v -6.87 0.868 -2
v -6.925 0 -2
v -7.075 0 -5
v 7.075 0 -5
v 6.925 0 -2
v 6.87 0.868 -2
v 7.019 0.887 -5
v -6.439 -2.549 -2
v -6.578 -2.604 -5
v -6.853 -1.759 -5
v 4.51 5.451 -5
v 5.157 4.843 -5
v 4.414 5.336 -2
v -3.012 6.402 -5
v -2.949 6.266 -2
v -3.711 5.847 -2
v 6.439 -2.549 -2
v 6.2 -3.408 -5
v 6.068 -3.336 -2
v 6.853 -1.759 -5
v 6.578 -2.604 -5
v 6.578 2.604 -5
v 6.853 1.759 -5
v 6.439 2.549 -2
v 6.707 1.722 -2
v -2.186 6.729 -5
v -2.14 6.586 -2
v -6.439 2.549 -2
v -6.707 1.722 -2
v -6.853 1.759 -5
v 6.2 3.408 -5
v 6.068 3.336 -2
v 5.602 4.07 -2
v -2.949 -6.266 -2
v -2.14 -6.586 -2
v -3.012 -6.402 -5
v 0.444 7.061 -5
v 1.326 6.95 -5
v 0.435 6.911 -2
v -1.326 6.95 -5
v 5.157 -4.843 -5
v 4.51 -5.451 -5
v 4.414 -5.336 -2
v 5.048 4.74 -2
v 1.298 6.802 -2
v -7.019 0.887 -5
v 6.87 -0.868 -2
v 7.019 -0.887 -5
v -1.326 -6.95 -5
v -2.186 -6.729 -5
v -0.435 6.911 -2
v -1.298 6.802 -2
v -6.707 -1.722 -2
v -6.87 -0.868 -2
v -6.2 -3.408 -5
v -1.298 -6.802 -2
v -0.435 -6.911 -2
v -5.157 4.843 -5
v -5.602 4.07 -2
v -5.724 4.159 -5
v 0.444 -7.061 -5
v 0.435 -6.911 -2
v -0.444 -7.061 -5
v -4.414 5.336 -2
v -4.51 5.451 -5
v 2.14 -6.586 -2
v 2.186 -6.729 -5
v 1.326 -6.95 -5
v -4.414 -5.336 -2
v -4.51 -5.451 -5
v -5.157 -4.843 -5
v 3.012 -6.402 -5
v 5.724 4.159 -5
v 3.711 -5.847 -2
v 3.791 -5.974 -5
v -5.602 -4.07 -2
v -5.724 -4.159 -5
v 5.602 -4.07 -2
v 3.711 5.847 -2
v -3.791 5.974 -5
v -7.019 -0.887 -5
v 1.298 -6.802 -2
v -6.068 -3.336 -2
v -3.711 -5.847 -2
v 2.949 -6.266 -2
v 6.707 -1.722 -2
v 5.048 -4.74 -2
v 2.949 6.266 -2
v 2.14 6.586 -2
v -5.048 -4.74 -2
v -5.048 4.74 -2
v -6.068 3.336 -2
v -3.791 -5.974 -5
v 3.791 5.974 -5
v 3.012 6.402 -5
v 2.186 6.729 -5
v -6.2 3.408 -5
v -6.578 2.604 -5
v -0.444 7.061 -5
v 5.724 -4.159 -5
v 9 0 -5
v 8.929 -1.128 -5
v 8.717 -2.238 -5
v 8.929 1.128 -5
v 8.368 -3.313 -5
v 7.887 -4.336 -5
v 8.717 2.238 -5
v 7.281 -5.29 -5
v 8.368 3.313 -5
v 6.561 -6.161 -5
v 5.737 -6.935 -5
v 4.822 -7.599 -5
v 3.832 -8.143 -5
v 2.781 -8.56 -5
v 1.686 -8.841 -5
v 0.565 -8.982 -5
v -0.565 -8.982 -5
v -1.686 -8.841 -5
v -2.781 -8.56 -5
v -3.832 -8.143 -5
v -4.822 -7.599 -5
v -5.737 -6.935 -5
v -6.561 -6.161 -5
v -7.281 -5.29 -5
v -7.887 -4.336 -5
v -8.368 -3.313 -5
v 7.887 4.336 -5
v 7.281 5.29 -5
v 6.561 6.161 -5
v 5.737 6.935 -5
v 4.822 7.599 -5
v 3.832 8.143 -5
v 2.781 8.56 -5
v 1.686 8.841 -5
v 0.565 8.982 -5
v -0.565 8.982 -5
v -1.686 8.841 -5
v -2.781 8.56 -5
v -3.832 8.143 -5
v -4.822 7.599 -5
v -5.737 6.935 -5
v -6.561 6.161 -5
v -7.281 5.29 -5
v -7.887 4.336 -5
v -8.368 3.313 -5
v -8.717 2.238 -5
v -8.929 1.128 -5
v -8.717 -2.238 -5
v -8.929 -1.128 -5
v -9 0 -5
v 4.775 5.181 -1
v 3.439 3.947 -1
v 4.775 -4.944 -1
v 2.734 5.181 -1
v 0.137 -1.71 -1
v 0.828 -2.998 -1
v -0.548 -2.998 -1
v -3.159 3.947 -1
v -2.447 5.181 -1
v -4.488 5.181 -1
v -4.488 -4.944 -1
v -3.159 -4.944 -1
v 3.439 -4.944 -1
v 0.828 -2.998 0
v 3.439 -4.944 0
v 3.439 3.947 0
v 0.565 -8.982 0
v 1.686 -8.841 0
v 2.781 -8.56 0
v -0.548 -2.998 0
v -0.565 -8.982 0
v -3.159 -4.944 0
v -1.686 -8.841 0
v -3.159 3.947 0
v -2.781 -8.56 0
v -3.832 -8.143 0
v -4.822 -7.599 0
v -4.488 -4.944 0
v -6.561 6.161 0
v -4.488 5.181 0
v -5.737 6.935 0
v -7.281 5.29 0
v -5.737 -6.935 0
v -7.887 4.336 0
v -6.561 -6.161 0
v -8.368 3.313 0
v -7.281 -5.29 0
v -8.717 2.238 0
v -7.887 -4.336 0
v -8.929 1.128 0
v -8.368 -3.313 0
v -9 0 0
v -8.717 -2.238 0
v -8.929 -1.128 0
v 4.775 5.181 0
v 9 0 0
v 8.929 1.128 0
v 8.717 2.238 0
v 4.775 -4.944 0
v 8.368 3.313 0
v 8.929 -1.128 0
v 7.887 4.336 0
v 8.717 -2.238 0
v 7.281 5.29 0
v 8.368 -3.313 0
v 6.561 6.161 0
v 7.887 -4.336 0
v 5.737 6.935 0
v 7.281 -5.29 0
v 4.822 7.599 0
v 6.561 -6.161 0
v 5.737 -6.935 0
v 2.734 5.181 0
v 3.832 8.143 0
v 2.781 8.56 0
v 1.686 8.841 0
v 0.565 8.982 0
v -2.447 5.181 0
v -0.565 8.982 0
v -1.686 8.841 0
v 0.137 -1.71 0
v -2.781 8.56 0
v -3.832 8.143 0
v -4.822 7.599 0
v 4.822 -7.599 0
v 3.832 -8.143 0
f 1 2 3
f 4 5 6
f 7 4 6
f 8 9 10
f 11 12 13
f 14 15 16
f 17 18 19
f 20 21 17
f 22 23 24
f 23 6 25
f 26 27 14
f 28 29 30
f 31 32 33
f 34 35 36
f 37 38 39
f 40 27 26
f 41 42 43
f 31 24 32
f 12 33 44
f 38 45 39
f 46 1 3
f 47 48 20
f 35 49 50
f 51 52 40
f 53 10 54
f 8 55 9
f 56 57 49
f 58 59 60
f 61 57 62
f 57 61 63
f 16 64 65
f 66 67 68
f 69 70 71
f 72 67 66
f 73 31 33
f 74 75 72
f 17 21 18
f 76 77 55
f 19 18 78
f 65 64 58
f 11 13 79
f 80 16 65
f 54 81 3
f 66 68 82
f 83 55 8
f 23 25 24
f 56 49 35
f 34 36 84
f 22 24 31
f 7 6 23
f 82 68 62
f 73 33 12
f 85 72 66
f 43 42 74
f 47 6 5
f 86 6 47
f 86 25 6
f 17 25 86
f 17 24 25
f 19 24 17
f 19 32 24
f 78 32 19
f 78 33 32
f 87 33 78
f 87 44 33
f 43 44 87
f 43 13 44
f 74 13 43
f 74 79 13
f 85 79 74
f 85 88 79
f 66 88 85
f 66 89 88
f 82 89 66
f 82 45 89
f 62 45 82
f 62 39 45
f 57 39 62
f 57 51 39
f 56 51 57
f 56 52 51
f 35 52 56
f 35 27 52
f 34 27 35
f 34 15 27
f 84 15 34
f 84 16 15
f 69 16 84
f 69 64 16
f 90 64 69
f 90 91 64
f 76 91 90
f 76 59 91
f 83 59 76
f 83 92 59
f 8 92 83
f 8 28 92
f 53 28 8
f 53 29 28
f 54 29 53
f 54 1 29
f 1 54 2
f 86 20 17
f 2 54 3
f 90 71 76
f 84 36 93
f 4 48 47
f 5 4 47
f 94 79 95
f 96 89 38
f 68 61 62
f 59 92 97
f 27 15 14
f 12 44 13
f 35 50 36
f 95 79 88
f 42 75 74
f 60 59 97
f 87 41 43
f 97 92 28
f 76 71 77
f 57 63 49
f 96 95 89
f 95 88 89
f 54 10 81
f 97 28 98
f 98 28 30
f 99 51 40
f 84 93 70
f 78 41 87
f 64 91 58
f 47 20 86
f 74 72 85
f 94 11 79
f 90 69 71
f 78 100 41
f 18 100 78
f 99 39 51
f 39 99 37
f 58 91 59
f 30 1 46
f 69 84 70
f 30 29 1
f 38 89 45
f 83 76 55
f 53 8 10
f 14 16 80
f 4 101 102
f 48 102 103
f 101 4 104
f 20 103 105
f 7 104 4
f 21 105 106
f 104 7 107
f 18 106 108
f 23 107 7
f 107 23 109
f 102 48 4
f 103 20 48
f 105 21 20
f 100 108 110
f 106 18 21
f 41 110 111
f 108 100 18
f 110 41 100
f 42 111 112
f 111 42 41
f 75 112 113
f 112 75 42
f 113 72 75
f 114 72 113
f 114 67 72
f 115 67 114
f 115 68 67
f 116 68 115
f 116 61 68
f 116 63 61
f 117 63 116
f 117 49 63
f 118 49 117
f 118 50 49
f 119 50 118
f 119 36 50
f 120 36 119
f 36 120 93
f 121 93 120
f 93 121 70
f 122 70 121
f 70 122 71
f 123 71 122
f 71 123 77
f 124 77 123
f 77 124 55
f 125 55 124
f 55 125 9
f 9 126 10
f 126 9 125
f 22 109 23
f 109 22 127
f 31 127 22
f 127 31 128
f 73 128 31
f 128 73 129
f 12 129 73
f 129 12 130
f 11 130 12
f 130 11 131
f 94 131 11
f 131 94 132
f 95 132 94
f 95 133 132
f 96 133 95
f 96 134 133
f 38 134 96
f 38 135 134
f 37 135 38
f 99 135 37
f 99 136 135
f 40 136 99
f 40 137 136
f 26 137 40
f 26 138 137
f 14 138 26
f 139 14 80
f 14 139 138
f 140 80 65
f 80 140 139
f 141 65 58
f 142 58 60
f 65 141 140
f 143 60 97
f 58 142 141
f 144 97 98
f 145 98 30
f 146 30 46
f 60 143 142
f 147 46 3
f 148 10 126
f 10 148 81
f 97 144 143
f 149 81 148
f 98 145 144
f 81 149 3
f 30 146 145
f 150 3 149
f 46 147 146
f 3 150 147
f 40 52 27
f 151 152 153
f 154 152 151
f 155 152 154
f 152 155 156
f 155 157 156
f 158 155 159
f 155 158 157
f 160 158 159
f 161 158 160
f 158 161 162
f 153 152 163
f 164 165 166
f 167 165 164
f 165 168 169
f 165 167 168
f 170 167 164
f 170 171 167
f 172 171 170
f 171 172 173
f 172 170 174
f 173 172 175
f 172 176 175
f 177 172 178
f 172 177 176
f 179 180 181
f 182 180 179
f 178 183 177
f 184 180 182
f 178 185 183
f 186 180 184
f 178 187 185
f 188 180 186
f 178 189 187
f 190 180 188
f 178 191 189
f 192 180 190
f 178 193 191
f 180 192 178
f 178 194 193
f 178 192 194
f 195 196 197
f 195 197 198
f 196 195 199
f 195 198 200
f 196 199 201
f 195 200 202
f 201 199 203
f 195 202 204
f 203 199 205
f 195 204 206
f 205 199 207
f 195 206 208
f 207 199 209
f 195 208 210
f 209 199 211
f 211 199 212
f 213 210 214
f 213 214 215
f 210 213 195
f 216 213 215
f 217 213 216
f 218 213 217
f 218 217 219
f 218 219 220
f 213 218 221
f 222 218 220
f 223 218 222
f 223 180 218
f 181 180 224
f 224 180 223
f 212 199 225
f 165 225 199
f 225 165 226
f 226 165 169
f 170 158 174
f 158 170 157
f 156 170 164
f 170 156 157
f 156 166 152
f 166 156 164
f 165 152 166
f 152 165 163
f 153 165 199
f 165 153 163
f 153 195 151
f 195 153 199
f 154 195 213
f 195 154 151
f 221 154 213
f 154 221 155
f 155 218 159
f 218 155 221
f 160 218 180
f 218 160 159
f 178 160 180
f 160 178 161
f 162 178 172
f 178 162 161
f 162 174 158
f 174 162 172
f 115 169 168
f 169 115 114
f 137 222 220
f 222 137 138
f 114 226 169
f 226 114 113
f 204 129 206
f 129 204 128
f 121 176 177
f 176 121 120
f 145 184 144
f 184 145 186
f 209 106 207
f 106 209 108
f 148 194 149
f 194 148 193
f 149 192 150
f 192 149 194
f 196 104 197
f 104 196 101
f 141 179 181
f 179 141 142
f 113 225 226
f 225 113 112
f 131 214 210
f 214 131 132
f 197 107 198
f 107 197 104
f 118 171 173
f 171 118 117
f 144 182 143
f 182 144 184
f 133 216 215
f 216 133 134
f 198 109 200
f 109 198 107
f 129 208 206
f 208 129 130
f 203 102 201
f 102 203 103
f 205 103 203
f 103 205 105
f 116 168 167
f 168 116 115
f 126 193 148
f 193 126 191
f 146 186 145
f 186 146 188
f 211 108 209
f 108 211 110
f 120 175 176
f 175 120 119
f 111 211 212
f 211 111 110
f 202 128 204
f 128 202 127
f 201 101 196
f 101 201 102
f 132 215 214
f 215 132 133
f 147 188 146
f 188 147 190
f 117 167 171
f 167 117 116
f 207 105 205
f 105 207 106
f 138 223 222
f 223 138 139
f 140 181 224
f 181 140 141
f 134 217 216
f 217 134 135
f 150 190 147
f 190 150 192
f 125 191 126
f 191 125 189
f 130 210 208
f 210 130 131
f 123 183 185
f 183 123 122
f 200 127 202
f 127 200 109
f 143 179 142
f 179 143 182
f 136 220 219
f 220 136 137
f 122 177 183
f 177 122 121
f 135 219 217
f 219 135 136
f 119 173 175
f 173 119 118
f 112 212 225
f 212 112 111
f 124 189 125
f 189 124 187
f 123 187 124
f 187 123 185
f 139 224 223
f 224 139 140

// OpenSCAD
$fn = 50;

difference() {
	union() {
		translate(v = [0, 0, -5.0]) {
			cylinder(h = 5, r = 9.0);
		}
	}
	union() {
		#translate(v = [0, 0, -5.0]) {
			cylinder(h = 3, r1 = 7.075, r2 = 6.925);
		}
		translate(v = [0, 0, -1]) {
			linear_extrude(height = 1) {
				text(font = "Impact", halign = "center", size = 10, text = "M", valign = "center");
			}
		}
	}
}
